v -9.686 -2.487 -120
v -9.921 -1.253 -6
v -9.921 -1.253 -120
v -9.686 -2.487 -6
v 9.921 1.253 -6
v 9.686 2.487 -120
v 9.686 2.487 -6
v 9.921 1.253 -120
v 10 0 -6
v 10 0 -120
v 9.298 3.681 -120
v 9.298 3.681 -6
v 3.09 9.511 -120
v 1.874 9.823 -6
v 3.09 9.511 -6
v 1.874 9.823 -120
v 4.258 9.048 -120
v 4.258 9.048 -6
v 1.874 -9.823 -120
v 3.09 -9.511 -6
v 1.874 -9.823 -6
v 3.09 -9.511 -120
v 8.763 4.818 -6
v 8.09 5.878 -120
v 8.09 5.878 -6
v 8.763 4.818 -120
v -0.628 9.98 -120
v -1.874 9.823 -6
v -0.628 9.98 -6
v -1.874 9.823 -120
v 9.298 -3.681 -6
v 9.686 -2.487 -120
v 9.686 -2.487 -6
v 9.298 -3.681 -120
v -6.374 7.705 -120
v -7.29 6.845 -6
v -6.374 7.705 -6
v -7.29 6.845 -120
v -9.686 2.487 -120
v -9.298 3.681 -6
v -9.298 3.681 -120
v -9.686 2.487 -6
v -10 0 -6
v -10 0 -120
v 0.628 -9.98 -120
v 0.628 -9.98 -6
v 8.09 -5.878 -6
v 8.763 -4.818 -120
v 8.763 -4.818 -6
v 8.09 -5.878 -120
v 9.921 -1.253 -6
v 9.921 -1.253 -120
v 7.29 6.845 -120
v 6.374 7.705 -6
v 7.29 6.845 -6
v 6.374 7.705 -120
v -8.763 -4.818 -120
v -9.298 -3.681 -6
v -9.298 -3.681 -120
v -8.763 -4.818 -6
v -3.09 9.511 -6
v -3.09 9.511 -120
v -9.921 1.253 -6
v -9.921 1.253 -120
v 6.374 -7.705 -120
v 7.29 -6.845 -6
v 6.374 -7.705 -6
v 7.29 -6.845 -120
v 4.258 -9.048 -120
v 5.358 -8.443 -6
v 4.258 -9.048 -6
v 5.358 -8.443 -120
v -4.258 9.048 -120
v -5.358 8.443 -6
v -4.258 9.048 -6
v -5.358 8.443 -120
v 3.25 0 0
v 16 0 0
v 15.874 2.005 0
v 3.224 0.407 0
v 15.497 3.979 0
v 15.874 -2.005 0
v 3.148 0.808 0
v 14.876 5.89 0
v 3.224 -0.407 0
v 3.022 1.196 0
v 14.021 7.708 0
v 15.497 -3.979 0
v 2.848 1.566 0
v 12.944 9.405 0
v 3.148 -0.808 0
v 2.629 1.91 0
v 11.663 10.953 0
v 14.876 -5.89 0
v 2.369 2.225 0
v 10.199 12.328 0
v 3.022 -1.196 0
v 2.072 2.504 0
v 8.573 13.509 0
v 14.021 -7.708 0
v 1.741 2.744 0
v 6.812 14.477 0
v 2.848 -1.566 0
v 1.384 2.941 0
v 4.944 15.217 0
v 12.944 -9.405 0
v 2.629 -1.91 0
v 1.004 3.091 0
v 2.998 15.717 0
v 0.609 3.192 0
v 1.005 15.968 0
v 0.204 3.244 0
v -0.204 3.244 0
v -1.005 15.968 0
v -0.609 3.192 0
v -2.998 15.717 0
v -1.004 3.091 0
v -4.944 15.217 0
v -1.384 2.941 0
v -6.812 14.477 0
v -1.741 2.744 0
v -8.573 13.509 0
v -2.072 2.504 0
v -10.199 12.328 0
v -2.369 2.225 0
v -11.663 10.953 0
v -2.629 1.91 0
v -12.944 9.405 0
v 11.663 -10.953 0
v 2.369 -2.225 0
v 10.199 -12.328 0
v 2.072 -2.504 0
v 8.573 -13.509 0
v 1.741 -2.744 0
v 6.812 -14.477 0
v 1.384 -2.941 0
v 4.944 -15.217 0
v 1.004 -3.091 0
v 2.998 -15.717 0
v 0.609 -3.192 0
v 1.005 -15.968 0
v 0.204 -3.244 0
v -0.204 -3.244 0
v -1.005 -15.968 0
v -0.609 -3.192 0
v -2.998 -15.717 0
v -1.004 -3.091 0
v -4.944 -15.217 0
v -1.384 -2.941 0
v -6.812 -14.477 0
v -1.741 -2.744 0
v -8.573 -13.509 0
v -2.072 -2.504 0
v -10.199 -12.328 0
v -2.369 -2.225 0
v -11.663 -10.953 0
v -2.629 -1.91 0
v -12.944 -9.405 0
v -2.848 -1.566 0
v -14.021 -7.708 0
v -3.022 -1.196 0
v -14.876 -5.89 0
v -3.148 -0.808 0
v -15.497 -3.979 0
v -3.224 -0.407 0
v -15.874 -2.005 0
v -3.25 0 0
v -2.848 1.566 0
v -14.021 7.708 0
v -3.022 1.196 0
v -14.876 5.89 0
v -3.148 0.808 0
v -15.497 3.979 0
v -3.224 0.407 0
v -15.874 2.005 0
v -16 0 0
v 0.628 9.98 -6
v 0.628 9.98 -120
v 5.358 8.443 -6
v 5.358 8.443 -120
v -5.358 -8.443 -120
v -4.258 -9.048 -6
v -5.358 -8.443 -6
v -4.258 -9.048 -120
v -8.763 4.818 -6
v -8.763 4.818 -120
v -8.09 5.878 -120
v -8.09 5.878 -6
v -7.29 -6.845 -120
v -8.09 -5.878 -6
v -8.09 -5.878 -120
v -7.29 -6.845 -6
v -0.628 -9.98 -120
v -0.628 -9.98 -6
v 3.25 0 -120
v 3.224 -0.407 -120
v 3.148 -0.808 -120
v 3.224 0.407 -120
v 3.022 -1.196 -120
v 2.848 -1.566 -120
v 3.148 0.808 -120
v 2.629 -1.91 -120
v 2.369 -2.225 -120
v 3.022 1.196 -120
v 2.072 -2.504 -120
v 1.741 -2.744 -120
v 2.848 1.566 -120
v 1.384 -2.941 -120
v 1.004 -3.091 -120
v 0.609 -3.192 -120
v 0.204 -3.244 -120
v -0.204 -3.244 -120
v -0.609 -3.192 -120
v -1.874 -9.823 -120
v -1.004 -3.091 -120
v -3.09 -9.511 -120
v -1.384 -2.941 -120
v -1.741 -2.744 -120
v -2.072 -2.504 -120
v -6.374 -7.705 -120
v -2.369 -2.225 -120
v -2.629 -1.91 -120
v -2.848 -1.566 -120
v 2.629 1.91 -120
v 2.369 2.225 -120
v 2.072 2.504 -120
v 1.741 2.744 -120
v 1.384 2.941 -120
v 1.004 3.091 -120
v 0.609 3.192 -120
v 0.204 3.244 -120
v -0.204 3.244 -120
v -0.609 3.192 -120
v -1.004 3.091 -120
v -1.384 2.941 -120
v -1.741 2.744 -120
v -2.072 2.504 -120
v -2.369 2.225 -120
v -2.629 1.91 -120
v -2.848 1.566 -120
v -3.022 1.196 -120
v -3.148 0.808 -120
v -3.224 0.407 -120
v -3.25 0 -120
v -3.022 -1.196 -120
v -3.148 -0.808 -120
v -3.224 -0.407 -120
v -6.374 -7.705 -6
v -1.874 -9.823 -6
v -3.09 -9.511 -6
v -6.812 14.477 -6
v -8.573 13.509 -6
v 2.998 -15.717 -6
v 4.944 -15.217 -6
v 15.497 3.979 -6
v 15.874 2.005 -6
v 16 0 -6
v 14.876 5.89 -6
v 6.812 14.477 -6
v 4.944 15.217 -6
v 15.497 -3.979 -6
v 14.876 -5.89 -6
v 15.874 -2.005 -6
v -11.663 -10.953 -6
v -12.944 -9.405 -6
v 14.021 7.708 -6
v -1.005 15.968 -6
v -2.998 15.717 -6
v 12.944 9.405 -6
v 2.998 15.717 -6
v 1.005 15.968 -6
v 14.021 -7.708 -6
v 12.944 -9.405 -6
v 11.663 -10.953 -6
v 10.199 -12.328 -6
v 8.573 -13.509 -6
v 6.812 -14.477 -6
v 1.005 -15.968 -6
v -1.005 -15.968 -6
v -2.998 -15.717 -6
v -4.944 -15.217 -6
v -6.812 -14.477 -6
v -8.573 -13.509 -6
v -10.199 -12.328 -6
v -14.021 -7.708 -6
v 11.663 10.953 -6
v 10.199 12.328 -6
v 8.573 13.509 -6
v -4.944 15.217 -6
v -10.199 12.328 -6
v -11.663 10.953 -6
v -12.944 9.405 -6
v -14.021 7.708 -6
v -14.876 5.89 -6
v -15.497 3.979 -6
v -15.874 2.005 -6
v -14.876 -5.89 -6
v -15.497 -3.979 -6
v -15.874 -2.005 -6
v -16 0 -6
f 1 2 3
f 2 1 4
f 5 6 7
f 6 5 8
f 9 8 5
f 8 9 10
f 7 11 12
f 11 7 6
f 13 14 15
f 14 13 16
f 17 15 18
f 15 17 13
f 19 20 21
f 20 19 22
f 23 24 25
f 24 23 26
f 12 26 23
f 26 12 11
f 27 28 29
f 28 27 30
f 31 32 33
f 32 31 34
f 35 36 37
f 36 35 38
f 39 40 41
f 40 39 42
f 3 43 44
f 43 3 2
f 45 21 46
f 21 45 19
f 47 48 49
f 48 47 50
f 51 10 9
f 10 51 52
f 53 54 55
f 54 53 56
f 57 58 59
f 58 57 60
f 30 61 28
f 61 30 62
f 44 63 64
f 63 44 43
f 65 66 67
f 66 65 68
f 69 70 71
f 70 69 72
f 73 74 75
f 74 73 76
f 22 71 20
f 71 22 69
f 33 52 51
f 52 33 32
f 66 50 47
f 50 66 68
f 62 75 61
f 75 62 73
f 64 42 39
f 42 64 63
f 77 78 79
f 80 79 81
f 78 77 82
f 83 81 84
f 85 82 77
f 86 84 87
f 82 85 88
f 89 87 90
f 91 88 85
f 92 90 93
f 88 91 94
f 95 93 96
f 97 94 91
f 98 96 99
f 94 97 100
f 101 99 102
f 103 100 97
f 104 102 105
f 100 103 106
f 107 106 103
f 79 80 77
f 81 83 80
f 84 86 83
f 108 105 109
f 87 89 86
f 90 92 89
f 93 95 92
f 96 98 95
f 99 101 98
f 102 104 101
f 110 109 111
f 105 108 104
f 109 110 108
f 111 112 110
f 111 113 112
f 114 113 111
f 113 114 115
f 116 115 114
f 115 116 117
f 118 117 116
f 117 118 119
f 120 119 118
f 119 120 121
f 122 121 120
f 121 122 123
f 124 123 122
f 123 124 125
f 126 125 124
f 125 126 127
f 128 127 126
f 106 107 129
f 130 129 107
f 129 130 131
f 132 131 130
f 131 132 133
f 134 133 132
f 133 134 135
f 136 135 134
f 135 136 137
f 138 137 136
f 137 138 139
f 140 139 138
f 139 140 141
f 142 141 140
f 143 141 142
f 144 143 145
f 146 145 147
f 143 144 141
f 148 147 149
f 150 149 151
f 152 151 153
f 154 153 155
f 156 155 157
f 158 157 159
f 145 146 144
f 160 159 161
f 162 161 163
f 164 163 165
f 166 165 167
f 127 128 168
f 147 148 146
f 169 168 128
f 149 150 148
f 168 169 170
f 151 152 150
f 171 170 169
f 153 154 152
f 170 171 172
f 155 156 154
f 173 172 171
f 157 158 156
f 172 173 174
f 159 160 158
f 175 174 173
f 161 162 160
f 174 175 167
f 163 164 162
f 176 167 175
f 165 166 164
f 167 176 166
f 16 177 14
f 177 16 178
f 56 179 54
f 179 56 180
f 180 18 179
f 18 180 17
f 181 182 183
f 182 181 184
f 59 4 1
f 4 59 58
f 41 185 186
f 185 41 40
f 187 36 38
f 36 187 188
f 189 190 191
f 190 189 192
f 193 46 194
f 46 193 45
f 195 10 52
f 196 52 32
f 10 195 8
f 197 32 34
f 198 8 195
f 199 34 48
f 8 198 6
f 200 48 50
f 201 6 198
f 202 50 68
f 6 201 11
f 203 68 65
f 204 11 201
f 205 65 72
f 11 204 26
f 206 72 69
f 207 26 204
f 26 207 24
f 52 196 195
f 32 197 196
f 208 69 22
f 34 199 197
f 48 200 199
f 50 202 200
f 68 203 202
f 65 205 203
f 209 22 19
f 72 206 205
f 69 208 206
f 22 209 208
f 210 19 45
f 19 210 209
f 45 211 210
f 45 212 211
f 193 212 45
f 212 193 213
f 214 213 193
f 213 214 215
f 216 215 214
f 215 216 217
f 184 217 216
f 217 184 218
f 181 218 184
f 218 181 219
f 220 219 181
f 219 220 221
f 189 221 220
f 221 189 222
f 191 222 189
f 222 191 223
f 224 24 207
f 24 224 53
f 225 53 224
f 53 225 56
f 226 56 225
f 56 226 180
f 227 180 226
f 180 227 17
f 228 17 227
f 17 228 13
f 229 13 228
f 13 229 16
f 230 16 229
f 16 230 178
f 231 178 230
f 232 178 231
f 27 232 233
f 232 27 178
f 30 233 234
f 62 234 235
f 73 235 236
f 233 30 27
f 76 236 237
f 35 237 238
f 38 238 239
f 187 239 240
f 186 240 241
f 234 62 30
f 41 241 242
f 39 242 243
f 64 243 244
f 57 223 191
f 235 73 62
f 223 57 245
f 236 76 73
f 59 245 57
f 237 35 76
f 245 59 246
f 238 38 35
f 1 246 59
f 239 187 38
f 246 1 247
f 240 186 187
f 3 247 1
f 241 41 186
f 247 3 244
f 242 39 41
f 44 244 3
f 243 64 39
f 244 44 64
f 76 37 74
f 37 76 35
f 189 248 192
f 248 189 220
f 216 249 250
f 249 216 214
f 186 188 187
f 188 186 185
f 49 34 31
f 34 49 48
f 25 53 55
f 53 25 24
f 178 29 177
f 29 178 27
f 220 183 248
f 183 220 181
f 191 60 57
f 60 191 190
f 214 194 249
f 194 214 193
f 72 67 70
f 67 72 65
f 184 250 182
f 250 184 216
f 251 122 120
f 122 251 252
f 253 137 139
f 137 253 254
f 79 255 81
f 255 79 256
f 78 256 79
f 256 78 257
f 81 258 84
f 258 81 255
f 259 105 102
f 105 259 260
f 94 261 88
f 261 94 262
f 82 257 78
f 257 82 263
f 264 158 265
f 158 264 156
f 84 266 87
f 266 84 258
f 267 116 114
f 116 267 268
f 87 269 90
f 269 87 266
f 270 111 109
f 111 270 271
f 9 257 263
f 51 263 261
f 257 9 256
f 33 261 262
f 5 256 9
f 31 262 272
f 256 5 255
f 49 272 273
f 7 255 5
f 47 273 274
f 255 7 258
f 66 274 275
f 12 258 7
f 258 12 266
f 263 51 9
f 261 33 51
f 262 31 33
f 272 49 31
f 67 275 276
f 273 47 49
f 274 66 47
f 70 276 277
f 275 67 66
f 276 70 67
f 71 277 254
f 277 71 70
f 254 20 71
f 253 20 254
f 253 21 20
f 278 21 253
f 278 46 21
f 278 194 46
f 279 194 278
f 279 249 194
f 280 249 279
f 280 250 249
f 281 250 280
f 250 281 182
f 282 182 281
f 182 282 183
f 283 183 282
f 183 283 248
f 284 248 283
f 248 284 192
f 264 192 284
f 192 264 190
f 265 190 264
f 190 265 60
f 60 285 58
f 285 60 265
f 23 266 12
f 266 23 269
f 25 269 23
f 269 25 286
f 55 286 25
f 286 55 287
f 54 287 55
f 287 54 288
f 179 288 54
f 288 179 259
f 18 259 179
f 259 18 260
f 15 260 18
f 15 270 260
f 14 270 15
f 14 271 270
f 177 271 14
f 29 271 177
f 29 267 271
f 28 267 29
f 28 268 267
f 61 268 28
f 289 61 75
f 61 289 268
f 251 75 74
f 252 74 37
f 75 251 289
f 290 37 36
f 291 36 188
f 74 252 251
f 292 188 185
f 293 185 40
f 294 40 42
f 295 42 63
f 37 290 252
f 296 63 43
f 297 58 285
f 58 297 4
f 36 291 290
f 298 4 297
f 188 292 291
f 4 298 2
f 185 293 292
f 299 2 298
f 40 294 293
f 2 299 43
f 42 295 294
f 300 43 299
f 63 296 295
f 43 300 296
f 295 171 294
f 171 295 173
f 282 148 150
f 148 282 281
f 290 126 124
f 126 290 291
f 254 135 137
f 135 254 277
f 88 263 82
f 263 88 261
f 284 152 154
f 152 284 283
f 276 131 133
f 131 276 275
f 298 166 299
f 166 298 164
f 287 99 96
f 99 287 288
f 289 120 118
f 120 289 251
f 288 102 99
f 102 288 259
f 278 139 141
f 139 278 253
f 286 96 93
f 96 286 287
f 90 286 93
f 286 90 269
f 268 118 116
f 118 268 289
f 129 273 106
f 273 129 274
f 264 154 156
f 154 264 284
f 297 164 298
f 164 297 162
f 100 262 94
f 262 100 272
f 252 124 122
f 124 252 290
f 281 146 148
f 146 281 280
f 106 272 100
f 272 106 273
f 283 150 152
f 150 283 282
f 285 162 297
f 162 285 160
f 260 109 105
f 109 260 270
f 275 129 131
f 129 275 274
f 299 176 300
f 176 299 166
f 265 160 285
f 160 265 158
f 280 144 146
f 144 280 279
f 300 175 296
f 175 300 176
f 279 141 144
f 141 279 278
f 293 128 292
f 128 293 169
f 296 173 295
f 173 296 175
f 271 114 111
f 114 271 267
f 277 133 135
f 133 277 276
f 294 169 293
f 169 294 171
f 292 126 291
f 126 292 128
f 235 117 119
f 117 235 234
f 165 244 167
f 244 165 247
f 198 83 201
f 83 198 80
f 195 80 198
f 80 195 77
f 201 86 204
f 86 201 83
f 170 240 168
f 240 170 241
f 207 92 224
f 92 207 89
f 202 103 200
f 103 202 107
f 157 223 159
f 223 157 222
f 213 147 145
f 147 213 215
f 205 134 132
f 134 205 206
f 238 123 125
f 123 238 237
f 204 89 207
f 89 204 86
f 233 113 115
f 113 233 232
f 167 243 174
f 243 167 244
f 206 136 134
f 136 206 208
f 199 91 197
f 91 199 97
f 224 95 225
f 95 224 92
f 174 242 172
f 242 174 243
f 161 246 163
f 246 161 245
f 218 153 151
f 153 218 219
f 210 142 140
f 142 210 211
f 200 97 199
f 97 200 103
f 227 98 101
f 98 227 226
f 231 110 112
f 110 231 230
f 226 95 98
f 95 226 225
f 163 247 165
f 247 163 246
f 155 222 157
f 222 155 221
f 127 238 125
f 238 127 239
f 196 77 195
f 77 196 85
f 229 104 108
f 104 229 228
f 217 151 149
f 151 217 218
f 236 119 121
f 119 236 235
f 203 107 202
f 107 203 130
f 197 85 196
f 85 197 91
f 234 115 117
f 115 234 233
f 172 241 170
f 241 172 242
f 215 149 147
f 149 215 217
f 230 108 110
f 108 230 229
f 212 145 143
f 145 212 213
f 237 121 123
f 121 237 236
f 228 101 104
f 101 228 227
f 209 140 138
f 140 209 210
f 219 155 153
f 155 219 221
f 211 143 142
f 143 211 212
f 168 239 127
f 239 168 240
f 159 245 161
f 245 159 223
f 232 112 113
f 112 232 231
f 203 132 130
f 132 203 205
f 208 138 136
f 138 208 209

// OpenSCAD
$fn = 50;


difference() {
	union() {
		translate(v = [0, 0, -120.0000000000]) {
			cylinder(h = 120, r = 10.0000000000);
		}
		translate(v = [0, 0, -6.0000000000]) {
			cylinder(h = 6, r = 16.0000000000);
		}
	}
	union() {
		#translate(v = [0, 0, -120]) {
			cylinder(h = 120, r = 3.2500000000);
		}
	}
}
